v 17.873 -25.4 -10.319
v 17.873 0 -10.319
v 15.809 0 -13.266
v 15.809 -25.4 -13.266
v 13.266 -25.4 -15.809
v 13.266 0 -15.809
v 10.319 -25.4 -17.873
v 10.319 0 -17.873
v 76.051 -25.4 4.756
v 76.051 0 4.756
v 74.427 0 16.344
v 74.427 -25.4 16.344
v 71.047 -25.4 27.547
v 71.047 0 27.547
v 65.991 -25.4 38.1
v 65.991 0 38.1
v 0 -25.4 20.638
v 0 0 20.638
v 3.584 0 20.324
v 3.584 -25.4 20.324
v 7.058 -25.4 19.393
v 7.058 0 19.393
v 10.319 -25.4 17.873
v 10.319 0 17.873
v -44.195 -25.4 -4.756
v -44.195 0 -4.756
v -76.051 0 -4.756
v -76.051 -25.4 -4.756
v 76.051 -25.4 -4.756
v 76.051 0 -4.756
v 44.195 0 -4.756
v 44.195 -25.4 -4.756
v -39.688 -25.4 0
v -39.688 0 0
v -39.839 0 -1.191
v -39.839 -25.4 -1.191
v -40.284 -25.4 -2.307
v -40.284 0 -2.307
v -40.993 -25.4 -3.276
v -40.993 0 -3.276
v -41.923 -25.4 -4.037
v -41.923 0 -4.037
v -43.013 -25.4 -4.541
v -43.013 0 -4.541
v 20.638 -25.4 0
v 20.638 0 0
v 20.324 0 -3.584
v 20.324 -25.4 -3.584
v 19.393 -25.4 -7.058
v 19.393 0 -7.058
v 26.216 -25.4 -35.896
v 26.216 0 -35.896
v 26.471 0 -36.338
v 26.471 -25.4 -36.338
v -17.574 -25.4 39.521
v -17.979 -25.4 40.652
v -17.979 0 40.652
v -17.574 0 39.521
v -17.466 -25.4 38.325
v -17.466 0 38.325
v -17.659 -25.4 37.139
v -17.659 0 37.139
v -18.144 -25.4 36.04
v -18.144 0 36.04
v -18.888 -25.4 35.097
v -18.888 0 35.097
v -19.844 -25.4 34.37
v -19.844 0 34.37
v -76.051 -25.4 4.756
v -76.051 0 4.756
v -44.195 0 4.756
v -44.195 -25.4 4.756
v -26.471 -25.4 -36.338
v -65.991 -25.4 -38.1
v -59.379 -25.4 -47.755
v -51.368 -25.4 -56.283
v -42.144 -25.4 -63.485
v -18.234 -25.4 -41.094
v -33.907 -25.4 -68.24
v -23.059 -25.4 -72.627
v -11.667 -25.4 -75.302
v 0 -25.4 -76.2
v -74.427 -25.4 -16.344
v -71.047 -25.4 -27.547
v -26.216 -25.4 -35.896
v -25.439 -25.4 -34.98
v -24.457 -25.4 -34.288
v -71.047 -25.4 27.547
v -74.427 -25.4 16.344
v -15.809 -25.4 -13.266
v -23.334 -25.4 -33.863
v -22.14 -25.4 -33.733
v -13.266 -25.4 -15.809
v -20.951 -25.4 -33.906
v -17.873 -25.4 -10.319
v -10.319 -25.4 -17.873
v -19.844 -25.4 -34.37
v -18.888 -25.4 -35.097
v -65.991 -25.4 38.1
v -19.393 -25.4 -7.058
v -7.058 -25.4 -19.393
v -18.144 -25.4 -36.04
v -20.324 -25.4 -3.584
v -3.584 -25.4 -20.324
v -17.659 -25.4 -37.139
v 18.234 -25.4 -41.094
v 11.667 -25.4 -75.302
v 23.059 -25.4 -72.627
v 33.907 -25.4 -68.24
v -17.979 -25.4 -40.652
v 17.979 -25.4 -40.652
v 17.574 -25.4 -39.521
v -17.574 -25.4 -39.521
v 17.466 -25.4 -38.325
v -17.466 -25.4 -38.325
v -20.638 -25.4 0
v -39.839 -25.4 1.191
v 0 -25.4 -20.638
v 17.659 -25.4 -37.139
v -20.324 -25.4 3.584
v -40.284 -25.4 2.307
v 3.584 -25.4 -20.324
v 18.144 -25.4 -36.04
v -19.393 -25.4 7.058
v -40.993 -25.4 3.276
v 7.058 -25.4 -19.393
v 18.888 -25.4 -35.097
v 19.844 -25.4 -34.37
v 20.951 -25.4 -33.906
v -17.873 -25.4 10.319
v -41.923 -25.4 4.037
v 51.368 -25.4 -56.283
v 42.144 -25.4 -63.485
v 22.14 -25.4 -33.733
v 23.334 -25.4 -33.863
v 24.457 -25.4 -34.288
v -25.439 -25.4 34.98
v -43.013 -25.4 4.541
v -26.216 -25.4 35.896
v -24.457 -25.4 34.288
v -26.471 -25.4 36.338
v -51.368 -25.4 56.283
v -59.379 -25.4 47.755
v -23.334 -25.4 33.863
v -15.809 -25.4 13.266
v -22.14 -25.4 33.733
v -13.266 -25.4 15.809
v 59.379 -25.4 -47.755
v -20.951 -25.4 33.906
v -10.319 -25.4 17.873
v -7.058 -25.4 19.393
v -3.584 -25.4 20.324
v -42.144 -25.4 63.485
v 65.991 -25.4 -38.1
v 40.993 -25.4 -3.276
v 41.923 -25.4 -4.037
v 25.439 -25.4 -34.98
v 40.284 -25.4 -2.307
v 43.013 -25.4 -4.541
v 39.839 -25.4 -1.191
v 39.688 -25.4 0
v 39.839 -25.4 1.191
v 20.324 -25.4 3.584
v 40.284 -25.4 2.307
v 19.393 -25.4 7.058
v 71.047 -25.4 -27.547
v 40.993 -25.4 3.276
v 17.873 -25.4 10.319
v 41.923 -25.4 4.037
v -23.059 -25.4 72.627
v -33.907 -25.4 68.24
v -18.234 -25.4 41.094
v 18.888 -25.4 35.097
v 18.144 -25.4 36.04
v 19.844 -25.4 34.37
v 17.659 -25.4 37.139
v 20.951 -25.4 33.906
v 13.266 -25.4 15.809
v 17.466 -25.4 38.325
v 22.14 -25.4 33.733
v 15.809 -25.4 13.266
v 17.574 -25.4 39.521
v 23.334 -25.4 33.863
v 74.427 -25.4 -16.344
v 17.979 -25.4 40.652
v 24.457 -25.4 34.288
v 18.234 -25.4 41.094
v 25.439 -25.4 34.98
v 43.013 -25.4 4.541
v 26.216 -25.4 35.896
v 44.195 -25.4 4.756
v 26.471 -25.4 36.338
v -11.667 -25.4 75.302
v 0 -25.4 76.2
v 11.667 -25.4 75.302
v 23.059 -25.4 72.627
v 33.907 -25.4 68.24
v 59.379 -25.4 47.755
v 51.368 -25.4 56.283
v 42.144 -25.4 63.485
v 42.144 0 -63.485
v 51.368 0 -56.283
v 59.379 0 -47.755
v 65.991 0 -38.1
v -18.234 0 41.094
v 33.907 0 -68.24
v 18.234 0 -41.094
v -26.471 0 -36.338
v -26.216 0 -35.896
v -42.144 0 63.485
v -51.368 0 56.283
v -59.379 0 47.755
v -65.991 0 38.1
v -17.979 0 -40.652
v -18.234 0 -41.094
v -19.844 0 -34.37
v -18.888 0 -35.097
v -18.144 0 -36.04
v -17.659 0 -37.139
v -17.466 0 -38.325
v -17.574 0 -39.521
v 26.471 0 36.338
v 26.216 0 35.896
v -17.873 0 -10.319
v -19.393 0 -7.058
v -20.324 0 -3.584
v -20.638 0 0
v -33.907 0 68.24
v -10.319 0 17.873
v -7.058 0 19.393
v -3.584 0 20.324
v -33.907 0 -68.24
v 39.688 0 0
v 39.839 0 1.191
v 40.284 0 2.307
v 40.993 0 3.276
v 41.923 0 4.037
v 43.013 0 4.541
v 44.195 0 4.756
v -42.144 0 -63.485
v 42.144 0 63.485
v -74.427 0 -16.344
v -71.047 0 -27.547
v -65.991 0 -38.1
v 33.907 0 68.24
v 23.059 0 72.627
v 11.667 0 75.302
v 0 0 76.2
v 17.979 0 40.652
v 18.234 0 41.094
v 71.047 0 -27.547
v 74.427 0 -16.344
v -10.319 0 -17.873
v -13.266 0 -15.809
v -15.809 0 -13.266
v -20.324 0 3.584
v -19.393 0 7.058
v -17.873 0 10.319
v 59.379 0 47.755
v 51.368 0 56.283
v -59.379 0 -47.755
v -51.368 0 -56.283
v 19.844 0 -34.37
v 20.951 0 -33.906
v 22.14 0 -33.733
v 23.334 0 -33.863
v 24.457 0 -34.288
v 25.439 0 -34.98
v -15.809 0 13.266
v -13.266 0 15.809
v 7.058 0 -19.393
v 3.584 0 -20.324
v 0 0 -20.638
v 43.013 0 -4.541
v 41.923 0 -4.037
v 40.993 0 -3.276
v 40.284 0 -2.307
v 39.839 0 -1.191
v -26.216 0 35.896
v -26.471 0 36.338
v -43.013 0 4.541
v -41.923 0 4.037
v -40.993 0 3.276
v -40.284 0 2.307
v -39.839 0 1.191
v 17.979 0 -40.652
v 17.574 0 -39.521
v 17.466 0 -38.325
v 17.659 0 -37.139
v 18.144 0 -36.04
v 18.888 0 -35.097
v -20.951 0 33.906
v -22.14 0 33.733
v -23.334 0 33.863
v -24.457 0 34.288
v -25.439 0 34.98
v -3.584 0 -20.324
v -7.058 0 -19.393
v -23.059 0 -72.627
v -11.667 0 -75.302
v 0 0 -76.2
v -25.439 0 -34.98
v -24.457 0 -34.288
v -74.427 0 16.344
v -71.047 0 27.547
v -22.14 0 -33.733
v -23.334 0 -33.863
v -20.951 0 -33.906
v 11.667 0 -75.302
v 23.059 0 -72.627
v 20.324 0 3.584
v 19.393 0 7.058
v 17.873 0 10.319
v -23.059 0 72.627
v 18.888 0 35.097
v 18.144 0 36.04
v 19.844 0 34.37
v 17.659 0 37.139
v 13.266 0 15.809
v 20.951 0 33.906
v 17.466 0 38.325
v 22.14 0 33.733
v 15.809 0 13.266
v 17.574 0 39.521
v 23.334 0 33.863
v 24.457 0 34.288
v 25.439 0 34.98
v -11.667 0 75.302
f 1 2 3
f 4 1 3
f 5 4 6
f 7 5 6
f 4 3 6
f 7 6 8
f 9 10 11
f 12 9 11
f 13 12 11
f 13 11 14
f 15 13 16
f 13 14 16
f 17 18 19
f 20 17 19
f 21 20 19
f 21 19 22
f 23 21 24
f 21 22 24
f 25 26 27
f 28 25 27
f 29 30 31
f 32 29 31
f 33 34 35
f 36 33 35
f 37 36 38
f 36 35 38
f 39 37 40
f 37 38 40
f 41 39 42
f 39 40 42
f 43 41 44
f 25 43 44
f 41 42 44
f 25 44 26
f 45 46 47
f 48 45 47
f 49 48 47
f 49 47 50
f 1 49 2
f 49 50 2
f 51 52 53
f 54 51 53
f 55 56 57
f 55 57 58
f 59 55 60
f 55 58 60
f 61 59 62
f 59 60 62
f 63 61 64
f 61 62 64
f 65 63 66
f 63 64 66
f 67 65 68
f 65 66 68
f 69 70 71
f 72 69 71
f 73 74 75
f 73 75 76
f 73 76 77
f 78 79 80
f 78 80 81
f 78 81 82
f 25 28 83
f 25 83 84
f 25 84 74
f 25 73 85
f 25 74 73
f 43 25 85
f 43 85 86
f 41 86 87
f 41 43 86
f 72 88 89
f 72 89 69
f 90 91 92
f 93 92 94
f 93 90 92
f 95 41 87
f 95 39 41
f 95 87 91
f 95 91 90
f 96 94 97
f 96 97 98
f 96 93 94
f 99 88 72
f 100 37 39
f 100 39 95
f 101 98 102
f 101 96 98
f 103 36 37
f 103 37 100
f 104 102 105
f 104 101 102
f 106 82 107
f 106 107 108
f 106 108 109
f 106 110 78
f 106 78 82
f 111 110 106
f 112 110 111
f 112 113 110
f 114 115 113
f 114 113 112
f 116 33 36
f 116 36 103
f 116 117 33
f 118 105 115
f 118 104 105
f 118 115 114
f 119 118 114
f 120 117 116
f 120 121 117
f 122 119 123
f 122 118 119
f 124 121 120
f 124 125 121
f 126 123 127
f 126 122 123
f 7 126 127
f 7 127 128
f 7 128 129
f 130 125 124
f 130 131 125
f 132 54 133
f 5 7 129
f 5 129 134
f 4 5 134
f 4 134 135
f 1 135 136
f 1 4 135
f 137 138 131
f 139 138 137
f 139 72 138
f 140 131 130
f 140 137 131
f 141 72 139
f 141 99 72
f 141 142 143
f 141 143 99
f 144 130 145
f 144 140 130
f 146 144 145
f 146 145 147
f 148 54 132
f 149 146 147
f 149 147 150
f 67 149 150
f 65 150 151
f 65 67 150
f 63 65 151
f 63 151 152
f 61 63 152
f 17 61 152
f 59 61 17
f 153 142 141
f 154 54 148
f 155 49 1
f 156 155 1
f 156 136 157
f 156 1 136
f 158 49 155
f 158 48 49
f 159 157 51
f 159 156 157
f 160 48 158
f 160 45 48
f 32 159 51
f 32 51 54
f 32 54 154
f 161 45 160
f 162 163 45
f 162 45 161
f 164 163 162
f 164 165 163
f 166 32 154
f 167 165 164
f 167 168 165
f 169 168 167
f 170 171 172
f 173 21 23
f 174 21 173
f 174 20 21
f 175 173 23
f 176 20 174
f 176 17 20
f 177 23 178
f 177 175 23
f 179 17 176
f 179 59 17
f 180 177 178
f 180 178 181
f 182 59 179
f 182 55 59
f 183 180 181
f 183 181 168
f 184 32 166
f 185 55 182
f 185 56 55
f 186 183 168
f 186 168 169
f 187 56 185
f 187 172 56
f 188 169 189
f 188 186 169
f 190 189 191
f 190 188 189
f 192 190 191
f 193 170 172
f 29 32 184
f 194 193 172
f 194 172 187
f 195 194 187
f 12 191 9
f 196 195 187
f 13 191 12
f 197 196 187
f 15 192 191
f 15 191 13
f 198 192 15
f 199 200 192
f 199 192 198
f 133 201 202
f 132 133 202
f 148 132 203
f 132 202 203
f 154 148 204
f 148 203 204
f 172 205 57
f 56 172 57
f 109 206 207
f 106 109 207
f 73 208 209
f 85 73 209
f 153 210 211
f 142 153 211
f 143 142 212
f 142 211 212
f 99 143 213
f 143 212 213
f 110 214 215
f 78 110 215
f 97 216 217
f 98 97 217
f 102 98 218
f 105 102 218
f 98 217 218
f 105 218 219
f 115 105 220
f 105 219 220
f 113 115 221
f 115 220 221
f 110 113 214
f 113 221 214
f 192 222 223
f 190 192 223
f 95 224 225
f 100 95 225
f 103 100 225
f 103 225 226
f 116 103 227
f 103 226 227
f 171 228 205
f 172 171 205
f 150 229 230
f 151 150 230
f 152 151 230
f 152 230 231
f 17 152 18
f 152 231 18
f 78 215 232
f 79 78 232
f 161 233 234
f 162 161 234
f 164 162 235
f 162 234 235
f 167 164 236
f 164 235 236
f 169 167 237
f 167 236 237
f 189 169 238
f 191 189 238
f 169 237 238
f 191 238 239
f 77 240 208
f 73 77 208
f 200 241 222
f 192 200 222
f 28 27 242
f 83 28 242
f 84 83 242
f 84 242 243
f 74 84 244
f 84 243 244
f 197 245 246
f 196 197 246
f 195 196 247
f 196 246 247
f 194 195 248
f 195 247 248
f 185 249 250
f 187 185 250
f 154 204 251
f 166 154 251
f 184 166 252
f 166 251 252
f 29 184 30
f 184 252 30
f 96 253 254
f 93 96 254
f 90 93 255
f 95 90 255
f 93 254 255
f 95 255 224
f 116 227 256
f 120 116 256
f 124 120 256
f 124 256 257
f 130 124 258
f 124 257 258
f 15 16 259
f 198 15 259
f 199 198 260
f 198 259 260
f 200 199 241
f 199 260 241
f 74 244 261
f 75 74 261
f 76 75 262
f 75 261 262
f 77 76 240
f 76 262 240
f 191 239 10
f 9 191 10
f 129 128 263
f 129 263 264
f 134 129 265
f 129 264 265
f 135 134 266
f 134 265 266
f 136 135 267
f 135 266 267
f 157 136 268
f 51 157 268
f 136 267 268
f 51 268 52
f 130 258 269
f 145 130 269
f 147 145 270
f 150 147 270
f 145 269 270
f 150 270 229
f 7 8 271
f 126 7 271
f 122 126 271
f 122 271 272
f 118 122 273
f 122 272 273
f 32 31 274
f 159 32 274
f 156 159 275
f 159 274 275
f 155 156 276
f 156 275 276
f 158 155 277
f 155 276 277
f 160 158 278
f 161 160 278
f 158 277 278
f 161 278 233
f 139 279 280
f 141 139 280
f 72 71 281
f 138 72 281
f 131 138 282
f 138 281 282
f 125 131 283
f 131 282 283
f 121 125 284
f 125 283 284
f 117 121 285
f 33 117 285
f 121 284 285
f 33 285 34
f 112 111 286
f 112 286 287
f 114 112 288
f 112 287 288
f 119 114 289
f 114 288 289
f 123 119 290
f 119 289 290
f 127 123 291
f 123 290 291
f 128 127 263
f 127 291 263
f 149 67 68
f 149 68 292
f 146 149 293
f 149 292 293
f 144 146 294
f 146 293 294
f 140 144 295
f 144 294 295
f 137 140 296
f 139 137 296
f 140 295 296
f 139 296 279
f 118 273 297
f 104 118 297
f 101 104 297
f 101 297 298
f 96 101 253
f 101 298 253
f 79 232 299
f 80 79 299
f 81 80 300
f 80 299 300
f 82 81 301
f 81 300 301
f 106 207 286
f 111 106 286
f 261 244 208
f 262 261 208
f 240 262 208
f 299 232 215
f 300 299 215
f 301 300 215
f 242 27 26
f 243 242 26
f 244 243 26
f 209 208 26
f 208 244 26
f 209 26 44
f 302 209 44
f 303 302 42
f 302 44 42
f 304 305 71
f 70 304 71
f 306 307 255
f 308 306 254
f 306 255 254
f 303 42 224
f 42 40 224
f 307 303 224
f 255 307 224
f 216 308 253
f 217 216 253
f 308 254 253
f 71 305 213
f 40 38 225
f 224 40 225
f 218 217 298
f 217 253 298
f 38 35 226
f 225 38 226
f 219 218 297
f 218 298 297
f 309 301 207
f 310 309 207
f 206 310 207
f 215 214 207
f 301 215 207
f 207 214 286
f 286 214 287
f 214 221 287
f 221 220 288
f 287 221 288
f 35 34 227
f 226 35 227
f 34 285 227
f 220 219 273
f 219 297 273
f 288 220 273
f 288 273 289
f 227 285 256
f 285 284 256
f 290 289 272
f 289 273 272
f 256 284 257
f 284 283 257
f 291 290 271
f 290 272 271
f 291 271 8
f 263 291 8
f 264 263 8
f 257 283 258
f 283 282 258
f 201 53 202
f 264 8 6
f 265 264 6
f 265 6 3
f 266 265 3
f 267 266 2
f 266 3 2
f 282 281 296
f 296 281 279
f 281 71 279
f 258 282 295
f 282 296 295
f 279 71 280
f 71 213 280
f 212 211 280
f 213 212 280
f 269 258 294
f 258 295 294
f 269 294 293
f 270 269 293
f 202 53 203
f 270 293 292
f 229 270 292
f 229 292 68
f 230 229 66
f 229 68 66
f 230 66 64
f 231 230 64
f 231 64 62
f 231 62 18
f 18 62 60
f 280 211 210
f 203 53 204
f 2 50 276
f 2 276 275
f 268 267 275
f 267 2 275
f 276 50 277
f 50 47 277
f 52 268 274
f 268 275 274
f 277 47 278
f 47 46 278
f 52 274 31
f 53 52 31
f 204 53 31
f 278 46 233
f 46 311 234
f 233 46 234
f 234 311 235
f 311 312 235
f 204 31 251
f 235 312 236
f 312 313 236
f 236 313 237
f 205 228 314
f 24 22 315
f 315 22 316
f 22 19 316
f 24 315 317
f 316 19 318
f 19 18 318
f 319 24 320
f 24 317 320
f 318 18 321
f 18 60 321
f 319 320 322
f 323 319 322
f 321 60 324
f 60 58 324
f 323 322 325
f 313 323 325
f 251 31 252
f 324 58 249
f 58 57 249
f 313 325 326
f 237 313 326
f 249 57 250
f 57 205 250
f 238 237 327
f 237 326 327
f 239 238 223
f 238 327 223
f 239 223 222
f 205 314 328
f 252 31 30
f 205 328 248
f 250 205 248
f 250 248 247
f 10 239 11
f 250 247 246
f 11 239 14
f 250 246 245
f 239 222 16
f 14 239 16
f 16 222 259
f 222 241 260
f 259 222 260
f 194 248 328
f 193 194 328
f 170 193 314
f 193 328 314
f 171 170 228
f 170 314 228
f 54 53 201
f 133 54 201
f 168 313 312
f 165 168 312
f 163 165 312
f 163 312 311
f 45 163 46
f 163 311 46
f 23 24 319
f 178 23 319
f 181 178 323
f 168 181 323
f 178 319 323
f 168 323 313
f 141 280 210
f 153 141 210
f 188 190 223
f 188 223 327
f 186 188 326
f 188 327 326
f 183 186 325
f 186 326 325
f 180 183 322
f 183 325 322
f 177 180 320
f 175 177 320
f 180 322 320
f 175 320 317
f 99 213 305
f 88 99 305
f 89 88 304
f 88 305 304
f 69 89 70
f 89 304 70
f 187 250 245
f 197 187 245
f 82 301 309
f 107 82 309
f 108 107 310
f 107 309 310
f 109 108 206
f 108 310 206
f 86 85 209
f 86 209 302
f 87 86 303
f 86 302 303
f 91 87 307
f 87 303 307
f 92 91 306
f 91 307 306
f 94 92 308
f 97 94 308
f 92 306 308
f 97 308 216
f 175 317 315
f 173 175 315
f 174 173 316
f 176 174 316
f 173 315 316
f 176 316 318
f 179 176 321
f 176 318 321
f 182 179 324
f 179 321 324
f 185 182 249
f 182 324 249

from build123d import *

# Parameters (mm, degrees)
F1_DEPTH = 25.4


with BuildPart() as f1:
    # F0 (on Front) → F1 (new body)
    with BuildSketch(Plane.XZ):
        with BuildLine():
            Line((-18.234044, -41.093612), (-33.907204, -68.240322))
            ThreePointArc((-33.907204, -68.240322), (-17.414469, -74.183396), (0, -76.2))
            Line((0, -76.2), (0, -44.45))
            ThreePointArc((0, -44.45), (-9.187875, -43.490061), (-17.97891, -40.651707))
            ThreePointArc((-17.97891, -40.651707), (-18.100554, -40.876079), (-18.234044, -41.093612))
        make_face()
        with BuildLine():
            Line((0, -44.45), (0, -76.2))
            ThreePointArc((0, -76.2), (17.414469, -74.183396), (33.907204, -68.240322))
            Line((33.907204, -68.240322), (18.234044, -41.093612))
            ThreePointArc((18.234044, -41.093612), (18.100554, -40.876079), (17.97891, -40.651707))
            ThreePointArc((17.97891, -40.651707), (9.187875, -43.490061), (0, -44.45))
        make_face()
        with BuildLine():
            Line((-17.97891, -40.651707), (-18.234044, -41.093612))
            ThreePointArc((-18.234044, -41.093612), (-18.100554, -40.876079), (-17.97891, -40.651707))
        make_face()
        with BuildLine():
            Line((0, -20.6375), (0, -44.45))
            ThreePointArc((0, -44.45), (9.187875, -43.490061), (17.97891, -40.651707))
            ThreePointArc((17.97891, -40.651707), (17.659459, -37.139382), (19.84375, -34.370383))
            Line((19.84375, -34.370383), (10.31875, -17.872599))
            ThreePointArc((10.31875, -17.872599), (5.341378, -19.934294), (0, -20.6375))
        make_face()
        with BuildLine():
            ThreePointArc((-17.97891, -40.651707), (-9.187875, -43.490061), (0, -44.45))
            Line((0, -44.45), (0, -20.6375))
            ThreePointArc((0, -20.6375), (-5.341378, -19.934294), (-10.31875, -17.872599))
            Line((-10.31875, -17.872599), (-19.84375, -34.370383))
            ThreePointArc((-19.84375, -34.370383), (-17.659459, -37.139382), (-17.97891, -40.651707))
        make_face()
        with BuildLine():
            ThreePointArc((17.97891, -40.651707), (18.100554, -40.876079), (18.234044, -41.093612))
            Line((18.234044, -41.093612), (17.97891, -40.651707))
        make_face()
        with BuildLine():
            ThreePointArc((-26.215956, -35.896046), (-23.333919, -33.863231), (-19.84375, -34.370383))
            Line((-19.84375, -34.370383), (-10.31875, -17.872599))
            ThreePointArc((-10.31875, -17.872599), (-14.592916, -14.592916), (-17.872599, -10.31875))
            Line((-17.872599, -10.31875), (-38.494829, -22.225))
            ThreePointArc((-38.494829, -22.225), (-33.06956, -29.701964), (-26.215956, -35.896046))
        make_face()
        with BuildLine():
            Line((10.31875, -17.872599), (19.84375, -34.370383))
            ThreePointArc((19.84375, -34.370383), (23.333919, -33.863231), (26.215956, -35.896046))
            ThreePointArc((26.215956, -35.896046), (33.06956, -29.701964), (38.494829, -22.225))
            Line((38.494829, -22.225), (17.872599, -10.31875))
            ThreePointArc((17.872599, -10.31875), (14.592916, -14.592916), (10.31875, -17.872599))
        make_face()
        with BuildLine():
            Line((-26.47109, -36.337951), (-26.215956, -35.896046))
            ThreePointArc((-26.215956, -35.896046), (-26.349446, -36.113579), (-26.47109, -36.337951))
        make_face()
        with BuildLine():
            ThreePointArc((-26.47109, -36.337951), (-26.349446, -36.113579), (-26.215956, -35.896046))
            ThreePointArc((-26.215956, -35.896046), (-33.06956, -29.701964), (-38.494829, -22.225))
            Line((-38.494829, -22.225), (-65.991136, -38.1))
            ThreePointArc((-65.991136, -38.1), (-55.537471, -52.173071), (-42.14425, -63.484661))
            Line((-42.14425, -63.484661), (-26.47109, -36.337951))
        make_face()
        with BuildLine():
            ThreePointArc((38.494829, -22.225), (33.06956, -29.701964), (26.215956, -35.896046))
            ThreePointArc((26.215956, -35.896046), (26.349446, -36.113579), (26.47109, -36.337951))
            Line((26.47109, -36.337951), (42.14425, -63.484661))
            ThreePointArc((42.14425, -63.484661), (55.537471, -52.173071), (65.991136, -38.1))
            Line((65.991136, -38.1), (38.494829, -22.225))
        make_face()
        with BuildLine():
            ThreePointArc((26.47109, -36.337951), (26.349446, -36.113579), (26.215956, -35.896046))
            Line((26.215956, -35.896046), (26.47109, -36.337951))
        make_face()
        with BuildLine():
            Line((-38.494829, -22.225), (-17.872599, -10.31875))
            ThreePointArc((-17.872599, -10.31875), (-19.934294, -5.341378), (-20.6375, 0))
            Line((-20.6375, 0), (-39.6875, 0))
            ThreePointArc((-39.6875, 0), (-40.993377, -3.276151), (-44.194866, -4.755661))
            ThreePointArc((-44.194866, -4.755661), (-42.257436, -13.788097), (-38.494829, -22.225))
        make_face()
        with BuildLine():
            ThreePointArc((20.6375, 0), (19.934294, -5.341378), (17.872599, -10.31875))
            Line((17.872599, -10.31875), (38.494829, -22.225))
            ThreePointArc((38.494829, -22.225), (42.257436, -13.788097), (44.194866, -4.755661))
            ThreePointArc((44.194866, -4.755661), (40.993377, -3.276151), (39.6875, 0))
            Line((39.6875, 0), (20.6375, 0))
        make_face()
        with BuildLine():
            Line((0, 44.45), (0, 20.6375))
            ThreePointArc((0, 20.6375), (5.341378, 19.934294), (10.31875, 17.872599))
            Line((10.31875, 17.872599), (19.84375, 34.370383))
            ThreePointArc((19.84375, 34.370383), (17.659459, 37.139382), (17.97891, 40.651707))
            ThreePointArc((17.97891, 40.651707), (9.187875, 43.490061), (0, 44.45))
        make_face()
        with BuildLine():
            ThreePointArc((-10.31875, 17.872599), (-5.341378, 19.934294), (0, 20.6375))
            Line((0, 20.6375), (0, 44.45))
            ThreePointArc((0, 44.45), (-9.187875, 43.490061), (-17.97891, 40.651707))
            ThreePointArc((-17.97891, 40.651707), (-17.659459, 37.139382), (-19.84375, 34.370383))
            Line((-19.84375, 34.370383), (-10.31875, 17.872599))
        make_face()
        with BuildLine():
            ThreePointArc((17.872599, 10.31875), (19.934294, 5.341378), (20.6375, 0))
            Line((20.6375, 0), (39.6875, 0))
            ThreePointArc((39.6875, 0), (40.993377, 3.276151), (44.194866, 4.755661))
            ThreePointArc((44.194866, 4.755661), (42.257436, 13.788097), (38.494829, 22.225))
            Line((38.494829, 22.225), (17.872599, 10.31875))
        make_face()
        with BuildLine():
            Line((-39.6875, 0), (-20.6375, 0))
            ThreePointArc((-20.6375, 0), (-19.934294, 5.341378), (-17.872599, 10.31875))
            Line((-17.872599, 10.31875), (-38.494829, 22.225))
            ThreePointArc((-38.494829, 22.225), (-42.257436, 13.788097), (-44.194866, 4.755661))
            ThreePointArc((-44.194866, 4.755661), (-40.993377, 3.276151), (-39.6875, 0))
        make_face()
        with BuildLine():
            ThreePointArc((-17.872599, 10.31875), (-14.592916, 14.592916), (-10.31875, 17.872599))
            Line((-10.31875, 17.872599), (-19.84375, 34.370383))
            ThreePointArc((-19.84375, 34.370383), (-23.333919, 33.863231), (-26.215956, 35.896046))
            ThreePointArc((-26.215956, 35.896046), (-33.06956, 29.701964), (-38.494829, 22.225))
            Line((-38.494829, 22.225), (-17.872599, 10.31875))
        make_face()
        with BuildLine():
            Line((19.84375, 34.370383), (10.31875, 17.872599))
            ThreePointArc((10.31875, 17.872599), (14.592916, 14.592916), (17.872599, 10.31875))
            Line((17.872599, 10.31875), (38.494829, 22.225))
            ThreePointArc((38.494829, 22.225), (33.06956, 29.701964), (26.215956, 35.896046))
            ThreePointArc((26.215956, 35.896046), (23.333919, 33.863231), (19.84375, 34.370383))
        make_face()
        with BuildLine():
            Line((-65.991136, -38.1), (-38.494829, -22.225))
            ThreePointArc((-38.494829, -22.225), (-42.257436, -13.788097), (-44.194866, -4.755661))
            ThreePointArc((-44.194866, -4.755661), (-44.45, -4.7625), (-44.705134, -4.755661))
            Line((-44.705134, -4.755661), (-76.051454, -4.755661))
            ThreePointArc((-76.051454, -4.755661), (-72.95194, -22.010325), (-65.991136, -38.1))
        make_face()
        with BuildLine():
            ThreePointArc((44.194866, -4.755661), (42.257436, -13.788097), (38.494829, -22.225))
            Line((38.494829, -22.225), (65.991136, -38.1))
            ThreePointArc((65.991136, -38.1), (72.95194, -22.010325), (76.051454, -4.755661))
            Line((76.051454, -4.755661), (44.705134, -4.755661))
            ThreePointArc((44.705134, -4.755661), (44.45, -4.7625), (44.194866, -4.755661))
        make_face()
        with BuildLine():
            ThreePointArc((-17.97891, 40.651707), (-9.187875, 43.490061), (0, 44.45))
            Line((0, 44.45), (0, 76.2))
            ThreePointArc((0, 76.2), (-17.414469, 74.183396), (-33.907204, 68.240322))
            Line((-33.907204, 68.240322), (-18.234044, 41.093612))
            ThreePointArc((-18.234044, 41.093612), (-18.100554, 40.876079), (-17.97891, 40.651707))
        make_face()
        with BuildLine():
            Line((0, 76.2), (0, 44.45))
            ThreePointArc((0, 44.45), (9.187875, 43.490061), (17.97891, 40.651707))
            ThreePointArc((17.97891, 40.651707), (18.100554, 40.876079), (18.234044, 41.093612))
            Line((18.234044, 41.093612), (33.907204, 68.240322))
            ThreePointArc((33.907204, 68.240322), (17.414469, 74.183396), (0, 76.2))
        make_face()
        with BuildLine():
            ThreePointArc((-44.194866, 4.755661), (-42.257436, 13.788097), (-38.494829, 22.225))
            Line((-38.494829, 22.225), (-65.991136, 38.1))
            ThreePointArc((-65.991136, 38.1), (-72.95194, 22.010325), (-76.051454, 4.755661))
            Line((-76.051454, 4.755661), (-44.705134, 4.755661))
            ThreePointArc((-44.705134, 4.755661), (-44.45, 4.7625), (-44.194866, 4.755661))
        make_face()
        with BuildLine():
            Line((-65.991136, 38.1), (-38.494829, 22.225))
            ThreePointArc((-38.494829, 22.225), (-33.06956, 29.701964), (-26.215956, 35.896046))
            ThreePointArc((-26.215956, 35.896046), (-26.349446, 36.113579), (-26.47109, 36.337951))
            Line((-26.47109, 36.337951), (-42.14425, 63.484661))
            ThreePointArc((-42.14425, 63.484661), (-55.537471, 52.173071), (-65.991136, 38.1))
        make_face()
        with BuildLine():
            ThreePointArc((26.215956, 35.896046), (33.06956, 29.701964), (38.494829, 22.225))
            Line((38.494829, 22.225), (65.991136, 38.1))
            ThreePointArc((65.991136, 38.1), (55.537471, 52.173071), (42.14425, 63.484661))
            Line((42.14425, 63.484661), (26.47109, 36.337951))
            ThreePointArc((26.47109, 36.337951), (26.349446, 36.113579), (26.215956, 35.896046))
        make_face()
        with BuildLine():
            Line((65.991136, 38.1), (38.494829, 22.225))
            ThreePointArc((38.494829, 22.225), (42.257436, 13.788097), (44.194866, 4.755661))
            ThreePointArc((44.194866, 4.755661), (44.45, 4.7625), (44.705134, 4.755661))
            Line((44.705134, 4.755661), (76.051454, 4.755661))
            ThreePointArc((76.051454, 4.755661), (72.95194, 22.010325), (65.991136, 38.1))
        make_face()
        with BuildLine():
            ThreePointArc((-44.705134, -4.755661), (-44.45, -4.7625), (-44.194866, -4.755661))
            Line((-44.194866, -4.755661), (-44.705134, -4.755661))
        make_face()
        with BuildLine():
            Line((44.705134, -4.755661), (44.194866, -4.755661))
            ThreePointArc((44.194866, -4.755661), (44.45, -4.7625), (44.705134, -4.755661))
        make_face()
        with BuildLine():
            ThreePointArc((18.234044, 41.093612), (18.100554, 40.876079), (17.97891, 40.651707))
            Line((17.97891, 40.651707), (18.234044, 41.093612))
        make_face()
        with BuildLine():
            Line((-18.234044, 41.093612), (-17.97891, 40.651707))
            ThreePointArc((-17.97891, 40.651707), (-18.100554, 40.876079), (-18.234044, 41.093612))
        make_face()
        with BuildLine():
            ThreePointArc((44.705134, 4.755661), (44.45, 4.7625), (44.194866, 4.755661))
            Line((44.194866, 4.755661), (44.705134, 4.755661))
        make_face()
        with BuildLine():
            Line((-44.705134, 4.755661), (-44.194866, 4.755661))
            ThreePointArc((-44.194866, 4.755661), (-44.45, 4.7625), (-44.705134, 4.755661))
        make_face()
        with BuildLine():
            ThreePointArc((-26.47109, 36.337951), (-26.349446, 36.113579), (-26.215956, 35.896046))
            Line((-26.215956, 35.896046), (-26.47109, 36.337951))
        make_face()
        with BuildLine():
            Line((26.47109, 36.337951), (26.215956, 35.896046))
            ThreePointArc((26.215956, 35.896046), (26.349446, 36.113579), (26.47109, 36.337951))
        make_face()
    extrude(amount=F1_DEPTH)


solid = f1.part
